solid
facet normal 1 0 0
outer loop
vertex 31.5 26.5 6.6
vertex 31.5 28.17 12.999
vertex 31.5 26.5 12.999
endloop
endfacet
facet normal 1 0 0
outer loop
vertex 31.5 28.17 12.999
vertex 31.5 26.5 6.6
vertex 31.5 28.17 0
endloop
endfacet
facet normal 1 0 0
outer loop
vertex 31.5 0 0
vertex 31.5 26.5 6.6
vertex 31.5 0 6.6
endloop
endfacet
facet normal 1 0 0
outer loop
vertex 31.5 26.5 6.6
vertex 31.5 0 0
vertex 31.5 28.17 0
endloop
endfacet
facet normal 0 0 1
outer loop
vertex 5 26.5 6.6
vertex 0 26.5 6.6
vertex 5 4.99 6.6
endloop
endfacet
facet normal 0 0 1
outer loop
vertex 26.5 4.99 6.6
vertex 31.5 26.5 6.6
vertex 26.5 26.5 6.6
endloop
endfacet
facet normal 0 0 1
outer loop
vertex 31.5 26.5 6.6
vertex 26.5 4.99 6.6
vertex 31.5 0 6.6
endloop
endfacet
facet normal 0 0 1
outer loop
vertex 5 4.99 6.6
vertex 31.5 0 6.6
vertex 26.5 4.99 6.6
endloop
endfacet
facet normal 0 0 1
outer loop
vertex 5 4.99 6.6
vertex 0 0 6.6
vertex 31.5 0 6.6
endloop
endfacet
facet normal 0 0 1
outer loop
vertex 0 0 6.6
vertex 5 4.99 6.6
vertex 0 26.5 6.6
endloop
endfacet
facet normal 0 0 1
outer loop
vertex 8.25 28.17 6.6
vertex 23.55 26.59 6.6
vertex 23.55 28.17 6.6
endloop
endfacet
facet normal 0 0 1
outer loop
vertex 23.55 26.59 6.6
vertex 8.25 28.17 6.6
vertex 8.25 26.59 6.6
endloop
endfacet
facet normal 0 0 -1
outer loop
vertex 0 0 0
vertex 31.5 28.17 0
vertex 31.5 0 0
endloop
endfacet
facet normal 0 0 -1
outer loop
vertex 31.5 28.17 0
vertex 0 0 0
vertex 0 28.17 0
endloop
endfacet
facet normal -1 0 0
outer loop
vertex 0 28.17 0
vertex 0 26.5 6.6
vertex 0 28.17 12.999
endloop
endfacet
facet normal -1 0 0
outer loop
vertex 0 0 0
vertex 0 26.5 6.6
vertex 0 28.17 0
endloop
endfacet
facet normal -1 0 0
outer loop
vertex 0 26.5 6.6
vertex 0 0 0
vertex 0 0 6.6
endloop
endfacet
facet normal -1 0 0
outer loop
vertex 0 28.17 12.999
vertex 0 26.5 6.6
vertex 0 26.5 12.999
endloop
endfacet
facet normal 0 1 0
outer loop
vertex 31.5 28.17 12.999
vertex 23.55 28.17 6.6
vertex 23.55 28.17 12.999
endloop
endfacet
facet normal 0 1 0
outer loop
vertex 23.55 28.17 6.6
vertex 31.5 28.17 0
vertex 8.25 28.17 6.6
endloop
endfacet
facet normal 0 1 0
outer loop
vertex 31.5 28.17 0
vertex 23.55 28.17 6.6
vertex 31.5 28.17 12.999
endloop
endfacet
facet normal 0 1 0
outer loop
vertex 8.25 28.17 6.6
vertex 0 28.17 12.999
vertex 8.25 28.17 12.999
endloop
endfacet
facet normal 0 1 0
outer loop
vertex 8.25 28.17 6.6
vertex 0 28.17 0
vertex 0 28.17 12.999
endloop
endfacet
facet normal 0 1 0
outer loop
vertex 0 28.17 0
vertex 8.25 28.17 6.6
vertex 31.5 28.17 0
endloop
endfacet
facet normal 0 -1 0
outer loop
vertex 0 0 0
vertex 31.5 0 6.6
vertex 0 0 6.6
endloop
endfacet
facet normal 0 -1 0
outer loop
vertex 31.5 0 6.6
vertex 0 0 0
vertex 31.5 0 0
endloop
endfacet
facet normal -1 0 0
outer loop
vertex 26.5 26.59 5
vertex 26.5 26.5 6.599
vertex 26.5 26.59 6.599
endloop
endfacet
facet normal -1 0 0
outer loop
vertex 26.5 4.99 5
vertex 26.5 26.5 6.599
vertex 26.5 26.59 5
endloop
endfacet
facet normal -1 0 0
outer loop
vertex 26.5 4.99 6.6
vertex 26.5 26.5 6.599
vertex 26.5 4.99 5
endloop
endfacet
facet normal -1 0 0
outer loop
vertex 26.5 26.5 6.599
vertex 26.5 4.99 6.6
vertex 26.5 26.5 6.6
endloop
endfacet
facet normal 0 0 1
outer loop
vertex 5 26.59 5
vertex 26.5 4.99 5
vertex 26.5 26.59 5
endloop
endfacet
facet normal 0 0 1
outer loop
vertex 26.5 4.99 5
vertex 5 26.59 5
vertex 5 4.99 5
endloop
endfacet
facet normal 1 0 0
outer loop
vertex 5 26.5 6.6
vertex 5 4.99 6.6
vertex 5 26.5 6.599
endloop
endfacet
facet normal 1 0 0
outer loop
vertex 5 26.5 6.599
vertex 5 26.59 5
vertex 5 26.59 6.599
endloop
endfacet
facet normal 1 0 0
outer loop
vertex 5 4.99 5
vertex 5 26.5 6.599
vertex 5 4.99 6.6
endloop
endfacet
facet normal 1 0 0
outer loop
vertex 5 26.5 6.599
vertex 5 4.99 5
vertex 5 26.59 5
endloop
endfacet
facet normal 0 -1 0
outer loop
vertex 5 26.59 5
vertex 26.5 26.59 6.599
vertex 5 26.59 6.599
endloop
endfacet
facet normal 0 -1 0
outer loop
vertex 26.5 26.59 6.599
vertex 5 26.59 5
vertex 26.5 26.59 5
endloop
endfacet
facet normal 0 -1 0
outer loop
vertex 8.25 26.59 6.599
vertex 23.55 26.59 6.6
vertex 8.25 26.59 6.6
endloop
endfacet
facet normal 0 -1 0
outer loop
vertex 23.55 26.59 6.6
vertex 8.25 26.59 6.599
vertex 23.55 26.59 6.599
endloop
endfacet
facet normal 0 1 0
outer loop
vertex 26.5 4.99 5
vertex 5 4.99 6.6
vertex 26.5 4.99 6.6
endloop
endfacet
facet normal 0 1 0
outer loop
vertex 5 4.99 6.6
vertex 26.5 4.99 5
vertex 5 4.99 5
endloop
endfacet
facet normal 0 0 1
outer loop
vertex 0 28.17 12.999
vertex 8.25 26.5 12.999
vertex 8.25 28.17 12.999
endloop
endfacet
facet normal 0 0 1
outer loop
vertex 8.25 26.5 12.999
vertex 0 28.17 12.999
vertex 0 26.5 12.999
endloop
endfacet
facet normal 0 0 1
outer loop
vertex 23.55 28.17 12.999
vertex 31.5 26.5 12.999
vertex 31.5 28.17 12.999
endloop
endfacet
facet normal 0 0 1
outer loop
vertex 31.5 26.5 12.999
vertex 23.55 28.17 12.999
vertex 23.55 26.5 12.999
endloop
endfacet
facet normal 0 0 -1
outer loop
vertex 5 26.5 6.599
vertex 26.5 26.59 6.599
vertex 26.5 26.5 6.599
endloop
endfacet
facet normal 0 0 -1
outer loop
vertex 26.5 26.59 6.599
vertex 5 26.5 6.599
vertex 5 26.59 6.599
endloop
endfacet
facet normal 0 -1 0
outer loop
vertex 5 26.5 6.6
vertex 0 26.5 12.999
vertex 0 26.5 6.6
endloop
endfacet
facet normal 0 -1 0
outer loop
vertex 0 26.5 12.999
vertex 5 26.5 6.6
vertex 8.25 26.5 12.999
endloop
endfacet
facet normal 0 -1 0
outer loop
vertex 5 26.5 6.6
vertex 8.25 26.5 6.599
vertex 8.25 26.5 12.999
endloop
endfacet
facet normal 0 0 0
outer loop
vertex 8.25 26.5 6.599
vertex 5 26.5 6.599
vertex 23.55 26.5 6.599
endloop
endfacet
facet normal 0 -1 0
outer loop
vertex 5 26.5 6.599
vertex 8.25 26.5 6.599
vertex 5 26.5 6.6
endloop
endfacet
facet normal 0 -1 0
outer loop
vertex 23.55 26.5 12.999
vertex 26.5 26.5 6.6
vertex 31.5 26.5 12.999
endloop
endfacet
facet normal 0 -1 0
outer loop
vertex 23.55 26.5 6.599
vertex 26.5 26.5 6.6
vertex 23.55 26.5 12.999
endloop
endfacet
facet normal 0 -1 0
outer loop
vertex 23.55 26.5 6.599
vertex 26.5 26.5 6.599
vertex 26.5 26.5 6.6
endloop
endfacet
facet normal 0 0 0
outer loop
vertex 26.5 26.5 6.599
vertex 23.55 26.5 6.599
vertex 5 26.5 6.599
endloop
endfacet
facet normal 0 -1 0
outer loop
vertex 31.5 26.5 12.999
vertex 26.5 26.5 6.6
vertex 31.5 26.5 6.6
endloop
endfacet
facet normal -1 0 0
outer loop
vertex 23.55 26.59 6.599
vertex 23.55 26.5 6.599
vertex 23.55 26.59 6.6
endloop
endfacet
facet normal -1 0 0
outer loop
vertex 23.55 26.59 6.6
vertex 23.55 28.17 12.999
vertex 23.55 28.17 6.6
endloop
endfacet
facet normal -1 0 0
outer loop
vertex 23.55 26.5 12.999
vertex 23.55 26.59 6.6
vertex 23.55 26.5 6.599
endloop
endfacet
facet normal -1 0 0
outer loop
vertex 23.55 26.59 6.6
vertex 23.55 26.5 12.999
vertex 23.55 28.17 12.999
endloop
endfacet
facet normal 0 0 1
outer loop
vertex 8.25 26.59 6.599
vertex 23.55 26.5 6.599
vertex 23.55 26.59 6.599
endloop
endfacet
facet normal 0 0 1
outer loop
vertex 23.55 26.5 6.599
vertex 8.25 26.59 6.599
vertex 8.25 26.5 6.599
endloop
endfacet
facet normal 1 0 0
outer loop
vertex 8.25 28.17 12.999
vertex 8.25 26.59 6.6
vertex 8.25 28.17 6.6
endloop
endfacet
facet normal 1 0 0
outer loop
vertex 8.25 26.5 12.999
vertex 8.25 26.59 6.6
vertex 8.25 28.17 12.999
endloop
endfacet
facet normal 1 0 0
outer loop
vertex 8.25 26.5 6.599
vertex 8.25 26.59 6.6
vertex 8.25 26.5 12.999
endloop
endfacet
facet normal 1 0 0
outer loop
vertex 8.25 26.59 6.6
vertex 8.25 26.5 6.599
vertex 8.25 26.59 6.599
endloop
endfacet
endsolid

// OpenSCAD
// -----------------------------------------------------------------------------
// 3D-Model (OpenSCAD) of HDMI-connector
//
// Author: Bernhard Bablok
// License: GPL3
//
// Website: https://github.com/bablokb/pi-webradio
//
// -----------------------------------------------------------------------------

$fa = 1;
$fs = 0.4;

fuzz = 0.001;

module hdmi_conn() {
  difference() {
    cube([31.5,28.17,6.6]);
    translate([5,4.99,5]) cube([21.5,21.6,1.6+fuzz]);
  }
  difference() {
    color("blue") translate([0,26.5,6.6-fuzz]) cube([31.5,1.67,6.4]);
    translate([8.25,26.5-fuzz/2,6.6-fuzz/2]) cube([15.30,1.67+fuzz,6.4+fuzz]);
  }
}

hdmi_conn();
